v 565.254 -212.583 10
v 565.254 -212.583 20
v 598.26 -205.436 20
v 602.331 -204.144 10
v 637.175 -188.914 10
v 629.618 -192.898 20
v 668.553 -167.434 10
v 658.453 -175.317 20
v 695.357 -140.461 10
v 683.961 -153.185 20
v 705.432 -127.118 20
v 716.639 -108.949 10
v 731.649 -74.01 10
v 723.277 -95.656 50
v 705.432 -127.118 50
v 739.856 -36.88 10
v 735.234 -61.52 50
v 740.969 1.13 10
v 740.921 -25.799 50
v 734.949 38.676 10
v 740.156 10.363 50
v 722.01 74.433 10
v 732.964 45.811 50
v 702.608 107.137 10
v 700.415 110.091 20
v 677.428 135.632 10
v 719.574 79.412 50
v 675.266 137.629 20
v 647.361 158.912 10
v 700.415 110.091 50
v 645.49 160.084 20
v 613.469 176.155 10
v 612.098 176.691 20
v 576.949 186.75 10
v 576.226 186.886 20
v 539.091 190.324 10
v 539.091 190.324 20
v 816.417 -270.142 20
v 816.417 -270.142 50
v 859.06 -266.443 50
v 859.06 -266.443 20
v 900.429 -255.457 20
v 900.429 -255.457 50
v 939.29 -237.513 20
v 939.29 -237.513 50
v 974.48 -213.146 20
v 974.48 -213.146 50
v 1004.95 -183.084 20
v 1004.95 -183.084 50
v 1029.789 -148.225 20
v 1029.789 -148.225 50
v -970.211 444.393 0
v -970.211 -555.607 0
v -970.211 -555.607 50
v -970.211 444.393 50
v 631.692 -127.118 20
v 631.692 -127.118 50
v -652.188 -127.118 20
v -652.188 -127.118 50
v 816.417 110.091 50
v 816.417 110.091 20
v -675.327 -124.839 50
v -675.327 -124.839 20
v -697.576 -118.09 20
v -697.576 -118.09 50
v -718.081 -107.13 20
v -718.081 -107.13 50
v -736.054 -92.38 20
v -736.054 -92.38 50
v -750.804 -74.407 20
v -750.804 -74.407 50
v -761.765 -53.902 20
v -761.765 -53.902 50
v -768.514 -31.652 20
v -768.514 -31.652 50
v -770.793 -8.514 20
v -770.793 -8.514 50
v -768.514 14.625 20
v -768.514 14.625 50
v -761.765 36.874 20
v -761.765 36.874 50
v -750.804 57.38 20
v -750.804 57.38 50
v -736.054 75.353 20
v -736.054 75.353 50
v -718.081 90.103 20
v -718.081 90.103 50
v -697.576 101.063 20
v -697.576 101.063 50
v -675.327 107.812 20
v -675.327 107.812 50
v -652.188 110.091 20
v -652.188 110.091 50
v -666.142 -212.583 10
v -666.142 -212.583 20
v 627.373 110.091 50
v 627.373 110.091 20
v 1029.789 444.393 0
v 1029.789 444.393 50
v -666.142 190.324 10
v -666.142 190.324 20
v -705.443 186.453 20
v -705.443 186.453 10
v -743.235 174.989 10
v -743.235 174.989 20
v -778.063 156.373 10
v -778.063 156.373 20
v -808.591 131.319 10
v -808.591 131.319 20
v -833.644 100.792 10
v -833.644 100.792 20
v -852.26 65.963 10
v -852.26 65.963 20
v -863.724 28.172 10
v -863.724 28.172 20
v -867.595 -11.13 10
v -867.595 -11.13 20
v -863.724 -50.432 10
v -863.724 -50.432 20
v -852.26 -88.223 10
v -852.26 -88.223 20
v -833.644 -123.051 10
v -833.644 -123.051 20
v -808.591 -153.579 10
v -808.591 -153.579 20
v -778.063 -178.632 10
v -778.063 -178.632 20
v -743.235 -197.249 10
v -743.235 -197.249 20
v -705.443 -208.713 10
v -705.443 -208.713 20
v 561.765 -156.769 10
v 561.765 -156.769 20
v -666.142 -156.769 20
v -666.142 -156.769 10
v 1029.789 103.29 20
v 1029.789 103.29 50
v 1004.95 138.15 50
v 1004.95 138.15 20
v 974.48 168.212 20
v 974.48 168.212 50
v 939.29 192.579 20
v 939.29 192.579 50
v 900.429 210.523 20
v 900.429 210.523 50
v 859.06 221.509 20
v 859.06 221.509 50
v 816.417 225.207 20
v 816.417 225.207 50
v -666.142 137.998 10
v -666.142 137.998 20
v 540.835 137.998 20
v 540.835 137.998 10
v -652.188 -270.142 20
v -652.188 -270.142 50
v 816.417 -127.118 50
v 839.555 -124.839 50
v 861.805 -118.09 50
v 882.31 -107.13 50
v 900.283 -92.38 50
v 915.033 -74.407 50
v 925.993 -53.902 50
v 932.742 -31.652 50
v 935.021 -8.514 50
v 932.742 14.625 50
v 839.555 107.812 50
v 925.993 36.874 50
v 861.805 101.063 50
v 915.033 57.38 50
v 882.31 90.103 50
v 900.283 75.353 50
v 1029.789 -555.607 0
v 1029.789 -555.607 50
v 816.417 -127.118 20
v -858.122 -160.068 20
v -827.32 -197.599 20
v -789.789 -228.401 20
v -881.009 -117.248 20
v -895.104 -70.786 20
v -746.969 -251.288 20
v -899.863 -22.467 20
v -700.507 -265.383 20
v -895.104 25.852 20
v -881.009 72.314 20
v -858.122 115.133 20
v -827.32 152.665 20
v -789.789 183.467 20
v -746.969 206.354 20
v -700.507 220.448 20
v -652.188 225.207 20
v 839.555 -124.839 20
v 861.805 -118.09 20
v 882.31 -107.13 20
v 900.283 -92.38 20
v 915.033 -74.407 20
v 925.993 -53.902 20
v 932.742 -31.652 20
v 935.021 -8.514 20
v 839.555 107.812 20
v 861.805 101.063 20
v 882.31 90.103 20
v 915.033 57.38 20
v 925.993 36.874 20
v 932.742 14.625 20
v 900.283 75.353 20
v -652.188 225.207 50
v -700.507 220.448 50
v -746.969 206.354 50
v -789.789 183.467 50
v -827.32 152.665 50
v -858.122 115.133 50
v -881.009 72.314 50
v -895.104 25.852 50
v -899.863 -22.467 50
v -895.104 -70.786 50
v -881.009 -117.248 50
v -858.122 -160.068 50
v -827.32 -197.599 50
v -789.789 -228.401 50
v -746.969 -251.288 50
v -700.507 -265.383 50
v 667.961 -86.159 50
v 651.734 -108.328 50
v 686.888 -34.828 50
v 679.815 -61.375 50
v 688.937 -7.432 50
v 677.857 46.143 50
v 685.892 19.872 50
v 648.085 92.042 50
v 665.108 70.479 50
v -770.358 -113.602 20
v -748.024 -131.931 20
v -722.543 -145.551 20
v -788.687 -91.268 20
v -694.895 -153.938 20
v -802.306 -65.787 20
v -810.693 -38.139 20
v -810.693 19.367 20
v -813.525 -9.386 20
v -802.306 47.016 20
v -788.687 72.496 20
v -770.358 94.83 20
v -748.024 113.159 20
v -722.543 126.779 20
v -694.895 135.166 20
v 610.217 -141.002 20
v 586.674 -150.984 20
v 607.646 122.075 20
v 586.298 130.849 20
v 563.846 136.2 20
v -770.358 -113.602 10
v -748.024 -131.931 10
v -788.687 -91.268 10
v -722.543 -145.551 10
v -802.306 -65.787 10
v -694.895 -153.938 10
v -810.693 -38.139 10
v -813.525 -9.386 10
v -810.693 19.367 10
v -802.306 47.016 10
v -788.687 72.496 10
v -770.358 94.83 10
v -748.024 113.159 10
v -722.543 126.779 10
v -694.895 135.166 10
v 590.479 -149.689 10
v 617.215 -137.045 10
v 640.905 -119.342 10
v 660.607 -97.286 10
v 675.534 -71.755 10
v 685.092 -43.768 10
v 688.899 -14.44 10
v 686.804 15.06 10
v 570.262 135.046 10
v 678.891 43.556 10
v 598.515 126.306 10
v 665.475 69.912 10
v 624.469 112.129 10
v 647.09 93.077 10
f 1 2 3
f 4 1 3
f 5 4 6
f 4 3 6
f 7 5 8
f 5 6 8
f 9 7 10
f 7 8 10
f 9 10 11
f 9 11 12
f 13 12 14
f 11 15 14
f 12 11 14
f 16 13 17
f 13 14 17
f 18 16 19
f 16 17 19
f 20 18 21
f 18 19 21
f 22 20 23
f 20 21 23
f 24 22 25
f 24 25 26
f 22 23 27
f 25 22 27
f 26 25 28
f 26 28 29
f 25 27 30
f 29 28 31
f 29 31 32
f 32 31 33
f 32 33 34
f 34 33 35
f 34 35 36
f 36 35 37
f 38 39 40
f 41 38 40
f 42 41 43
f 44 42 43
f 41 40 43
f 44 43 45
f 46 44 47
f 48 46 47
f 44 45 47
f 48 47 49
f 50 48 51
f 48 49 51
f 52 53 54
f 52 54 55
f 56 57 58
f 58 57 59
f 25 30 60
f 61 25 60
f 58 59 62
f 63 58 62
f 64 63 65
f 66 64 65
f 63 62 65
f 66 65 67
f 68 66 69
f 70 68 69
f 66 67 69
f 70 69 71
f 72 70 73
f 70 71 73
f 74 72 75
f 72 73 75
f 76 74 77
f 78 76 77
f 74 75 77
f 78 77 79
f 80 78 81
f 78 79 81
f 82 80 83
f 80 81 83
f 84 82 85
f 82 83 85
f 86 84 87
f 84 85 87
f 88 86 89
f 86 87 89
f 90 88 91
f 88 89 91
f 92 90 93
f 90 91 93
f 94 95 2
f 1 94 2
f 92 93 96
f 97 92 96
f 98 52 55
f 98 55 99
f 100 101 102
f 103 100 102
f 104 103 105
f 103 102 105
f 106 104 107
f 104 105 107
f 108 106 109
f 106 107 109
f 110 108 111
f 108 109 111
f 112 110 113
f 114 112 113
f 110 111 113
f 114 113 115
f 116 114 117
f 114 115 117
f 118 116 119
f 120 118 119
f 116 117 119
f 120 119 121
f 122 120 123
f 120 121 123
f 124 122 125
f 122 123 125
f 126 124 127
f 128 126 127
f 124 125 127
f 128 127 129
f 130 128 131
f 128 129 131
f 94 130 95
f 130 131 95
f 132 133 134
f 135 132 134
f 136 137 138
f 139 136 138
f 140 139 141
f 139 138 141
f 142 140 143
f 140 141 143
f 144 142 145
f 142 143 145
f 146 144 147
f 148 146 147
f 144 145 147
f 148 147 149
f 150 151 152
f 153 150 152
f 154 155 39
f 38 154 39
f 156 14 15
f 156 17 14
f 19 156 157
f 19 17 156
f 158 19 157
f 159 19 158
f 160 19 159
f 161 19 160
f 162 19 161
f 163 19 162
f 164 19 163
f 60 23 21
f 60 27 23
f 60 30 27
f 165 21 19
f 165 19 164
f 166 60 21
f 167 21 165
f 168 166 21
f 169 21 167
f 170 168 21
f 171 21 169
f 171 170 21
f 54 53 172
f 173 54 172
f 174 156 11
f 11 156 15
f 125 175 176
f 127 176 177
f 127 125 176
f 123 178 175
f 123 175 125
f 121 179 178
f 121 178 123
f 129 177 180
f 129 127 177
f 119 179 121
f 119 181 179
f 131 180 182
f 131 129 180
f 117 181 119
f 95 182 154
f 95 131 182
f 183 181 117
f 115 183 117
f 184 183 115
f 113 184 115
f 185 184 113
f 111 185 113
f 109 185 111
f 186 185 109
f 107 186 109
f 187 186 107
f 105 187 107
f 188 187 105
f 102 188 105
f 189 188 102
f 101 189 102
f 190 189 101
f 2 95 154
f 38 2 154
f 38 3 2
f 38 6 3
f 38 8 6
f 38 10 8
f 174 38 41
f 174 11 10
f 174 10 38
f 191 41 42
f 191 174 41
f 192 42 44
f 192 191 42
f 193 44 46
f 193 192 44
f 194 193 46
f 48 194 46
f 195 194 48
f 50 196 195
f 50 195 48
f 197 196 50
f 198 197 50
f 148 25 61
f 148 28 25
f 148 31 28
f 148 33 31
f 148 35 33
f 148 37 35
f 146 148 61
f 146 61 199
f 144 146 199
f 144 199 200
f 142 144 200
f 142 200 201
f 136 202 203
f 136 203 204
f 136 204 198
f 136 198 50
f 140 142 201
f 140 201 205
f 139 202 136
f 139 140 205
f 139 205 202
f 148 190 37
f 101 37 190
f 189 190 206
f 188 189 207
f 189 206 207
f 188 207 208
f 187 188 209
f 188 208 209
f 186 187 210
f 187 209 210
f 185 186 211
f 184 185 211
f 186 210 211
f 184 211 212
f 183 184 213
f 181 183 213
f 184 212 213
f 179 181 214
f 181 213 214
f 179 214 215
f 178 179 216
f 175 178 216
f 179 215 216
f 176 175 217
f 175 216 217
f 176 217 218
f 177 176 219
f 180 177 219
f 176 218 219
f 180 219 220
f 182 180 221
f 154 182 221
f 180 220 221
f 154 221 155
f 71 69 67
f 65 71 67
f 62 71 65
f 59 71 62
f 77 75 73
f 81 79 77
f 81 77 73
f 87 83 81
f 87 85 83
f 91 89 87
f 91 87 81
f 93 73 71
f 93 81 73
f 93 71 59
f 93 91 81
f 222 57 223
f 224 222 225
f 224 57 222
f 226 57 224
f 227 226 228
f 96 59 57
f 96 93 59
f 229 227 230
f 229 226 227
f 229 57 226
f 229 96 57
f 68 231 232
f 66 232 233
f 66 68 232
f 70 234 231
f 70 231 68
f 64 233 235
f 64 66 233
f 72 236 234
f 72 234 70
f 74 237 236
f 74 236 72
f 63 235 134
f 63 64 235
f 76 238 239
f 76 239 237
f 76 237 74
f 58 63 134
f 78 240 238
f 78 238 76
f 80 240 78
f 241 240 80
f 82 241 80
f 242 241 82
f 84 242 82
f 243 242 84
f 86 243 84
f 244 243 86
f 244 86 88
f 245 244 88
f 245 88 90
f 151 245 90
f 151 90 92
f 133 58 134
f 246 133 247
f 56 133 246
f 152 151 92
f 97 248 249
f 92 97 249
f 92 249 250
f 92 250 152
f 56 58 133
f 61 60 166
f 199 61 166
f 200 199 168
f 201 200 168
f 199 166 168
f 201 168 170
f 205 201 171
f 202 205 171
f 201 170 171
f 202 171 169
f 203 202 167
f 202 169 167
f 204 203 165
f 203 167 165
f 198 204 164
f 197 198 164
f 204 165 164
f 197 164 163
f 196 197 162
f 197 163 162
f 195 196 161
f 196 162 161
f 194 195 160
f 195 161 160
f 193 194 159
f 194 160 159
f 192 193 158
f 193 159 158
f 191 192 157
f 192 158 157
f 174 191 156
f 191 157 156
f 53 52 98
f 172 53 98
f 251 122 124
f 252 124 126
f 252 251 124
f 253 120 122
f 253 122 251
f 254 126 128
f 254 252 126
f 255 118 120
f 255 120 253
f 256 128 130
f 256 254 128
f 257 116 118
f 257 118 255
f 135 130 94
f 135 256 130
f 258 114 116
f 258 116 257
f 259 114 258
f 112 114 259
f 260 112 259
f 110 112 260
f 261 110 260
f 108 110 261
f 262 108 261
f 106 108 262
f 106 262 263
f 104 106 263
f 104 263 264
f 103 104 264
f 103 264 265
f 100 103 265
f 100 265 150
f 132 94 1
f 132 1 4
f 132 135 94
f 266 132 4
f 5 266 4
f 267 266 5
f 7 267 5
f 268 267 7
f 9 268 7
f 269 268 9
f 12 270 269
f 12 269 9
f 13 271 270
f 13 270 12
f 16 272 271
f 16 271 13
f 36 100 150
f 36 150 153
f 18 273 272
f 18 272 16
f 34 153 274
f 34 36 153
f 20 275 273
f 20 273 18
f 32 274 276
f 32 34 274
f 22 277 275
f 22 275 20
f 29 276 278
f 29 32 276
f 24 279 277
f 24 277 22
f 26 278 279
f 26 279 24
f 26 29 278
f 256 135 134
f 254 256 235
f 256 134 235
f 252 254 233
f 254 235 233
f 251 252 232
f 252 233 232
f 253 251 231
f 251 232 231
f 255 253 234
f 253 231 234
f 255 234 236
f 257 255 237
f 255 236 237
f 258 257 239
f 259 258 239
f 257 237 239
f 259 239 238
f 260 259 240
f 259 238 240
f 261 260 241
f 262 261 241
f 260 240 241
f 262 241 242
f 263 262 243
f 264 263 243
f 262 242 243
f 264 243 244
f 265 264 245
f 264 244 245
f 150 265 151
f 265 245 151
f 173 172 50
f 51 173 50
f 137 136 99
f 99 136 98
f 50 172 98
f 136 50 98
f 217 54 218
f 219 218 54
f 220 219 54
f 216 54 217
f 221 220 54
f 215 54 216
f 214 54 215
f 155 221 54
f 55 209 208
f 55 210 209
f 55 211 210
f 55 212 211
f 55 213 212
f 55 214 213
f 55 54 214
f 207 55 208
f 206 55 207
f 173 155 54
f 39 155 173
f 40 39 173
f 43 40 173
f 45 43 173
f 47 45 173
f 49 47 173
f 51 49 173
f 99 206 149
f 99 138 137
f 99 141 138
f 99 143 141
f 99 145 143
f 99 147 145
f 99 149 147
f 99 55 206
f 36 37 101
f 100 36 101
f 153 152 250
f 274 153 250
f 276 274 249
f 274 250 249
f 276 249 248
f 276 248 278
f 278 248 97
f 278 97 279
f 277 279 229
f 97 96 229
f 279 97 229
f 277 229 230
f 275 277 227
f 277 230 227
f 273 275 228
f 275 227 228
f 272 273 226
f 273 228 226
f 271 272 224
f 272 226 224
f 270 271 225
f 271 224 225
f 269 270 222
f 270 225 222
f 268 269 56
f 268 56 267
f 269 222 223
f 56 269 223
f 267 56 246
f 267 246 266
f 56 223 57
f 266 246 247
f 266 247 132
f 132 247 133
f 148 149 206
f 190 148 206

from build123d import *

# Parameters (mm, degrees)
F0_W     = 2000
F0_H     = 1000
F1_DEPTH = 50
F3_DEPTH = 30
F5_DEPTH = 40


with BuildPart() as f1:
    # F0 (on Top) → F1 (new body)
    with BuildSketch(Plane.XY):
        with Locations((29.7885835171, -55.6066778026)):
            Rectangle(F0_W, F0_H)
    extrude(amount=F1_DEPTH)

    # F2 (on face) → F3 (cut)
    with BuildSketch(Plane.XY.offset(50)):
        with BuildLine():
            Line((816.4165019989, 225.2072840929), (-652.1881222725, 225.2072840929))
            ThreePointArc((-652.1881222725, 225.2072840929), (-899.8625352979, -22.4671289325), (-652.1881222725, -270.1415419579))
            Line((-652.1881222725, -270.1415419579), (816.4165019989, -270.1415419579))
            ThreePointArc((816.4165019989, -270.1415419579), (939.2897686207, -237.5131128921), (1029.7885835171, -148.2247119884))
            Line((1029.7885835171, -148.2247119884), (1029.7885835171, 103.2904541234))
            ThreePointArc((1029.7885835171, 103.2904541234), (939.2897686207, 192.5788550272), (816.4165019989, 225.2072840929))
        make_face()
        with BuildLine():
            Line((816.4165019989, -127.1182894707), (-652.1881222725, -127.1182894707))
            ThreePointArc((-652.1881222725, -127.1182894707), (-770.7927748561, -8.5136368871), (-652.1881222725, 110.0910156965))
            Line((-652.1881222725, 110.0910156965), (816.4165019989, 110.0910156965))
            ThreePointArc((816.4165019989, 110.0910156965), (935.0211545825, -8.5136368871), (816.4165019989, -127.1182894707))
        make_face(mode=Mode.SUBTRACT)
    extrude(amount=-F3_DEPTH, mode=Mode.SUBTRACT)

    # F4 (on face) → F5 (cut)
    with BuildSketch(Plane.XY.offset(50)):
        with BuildLine():
            Line((539.0909314156, 190.3235763311), (-666.1416292191, 190.3235763311))
            ThreePointArc((-666.1416292191, 190.3235763311), (-867.5951212645, -11.1299157143), (-666.1416292191, -212.5834077597))
            Line((-666.1416292191, -212.5834077597), (565.2537345886, -212.5834077597))
            ThreePointArc((565.2537345886, -212.5834077597), (740.9686977118, 1.1295941099), (539.0909314156, 190.3235763311))
        make_face()
        with BuildLine():
            Line((561.7653727531, -156.7694544792), (-666.1416292191, -156.7694544792))
            ThreePointArc((-666.1416292191, -156.7694544792), (-813.5253489017, -9.3857347965), (-666.1416292191, 137.9979848862))
            Line((-666.1416292191, 137.9979848862), (540.835082531, 137.9979848862))
            ThreePointArc((540.835082531, 137.9979848862), (688.589879711, 0.362669805), (561.7653727531, -156.7694544792))
        make_face(mode=Mode.SUBTRACT)
    extrude(amount=-F5_DEPTH, mode=Mode.SUBTRACT)


solid = f1.part
